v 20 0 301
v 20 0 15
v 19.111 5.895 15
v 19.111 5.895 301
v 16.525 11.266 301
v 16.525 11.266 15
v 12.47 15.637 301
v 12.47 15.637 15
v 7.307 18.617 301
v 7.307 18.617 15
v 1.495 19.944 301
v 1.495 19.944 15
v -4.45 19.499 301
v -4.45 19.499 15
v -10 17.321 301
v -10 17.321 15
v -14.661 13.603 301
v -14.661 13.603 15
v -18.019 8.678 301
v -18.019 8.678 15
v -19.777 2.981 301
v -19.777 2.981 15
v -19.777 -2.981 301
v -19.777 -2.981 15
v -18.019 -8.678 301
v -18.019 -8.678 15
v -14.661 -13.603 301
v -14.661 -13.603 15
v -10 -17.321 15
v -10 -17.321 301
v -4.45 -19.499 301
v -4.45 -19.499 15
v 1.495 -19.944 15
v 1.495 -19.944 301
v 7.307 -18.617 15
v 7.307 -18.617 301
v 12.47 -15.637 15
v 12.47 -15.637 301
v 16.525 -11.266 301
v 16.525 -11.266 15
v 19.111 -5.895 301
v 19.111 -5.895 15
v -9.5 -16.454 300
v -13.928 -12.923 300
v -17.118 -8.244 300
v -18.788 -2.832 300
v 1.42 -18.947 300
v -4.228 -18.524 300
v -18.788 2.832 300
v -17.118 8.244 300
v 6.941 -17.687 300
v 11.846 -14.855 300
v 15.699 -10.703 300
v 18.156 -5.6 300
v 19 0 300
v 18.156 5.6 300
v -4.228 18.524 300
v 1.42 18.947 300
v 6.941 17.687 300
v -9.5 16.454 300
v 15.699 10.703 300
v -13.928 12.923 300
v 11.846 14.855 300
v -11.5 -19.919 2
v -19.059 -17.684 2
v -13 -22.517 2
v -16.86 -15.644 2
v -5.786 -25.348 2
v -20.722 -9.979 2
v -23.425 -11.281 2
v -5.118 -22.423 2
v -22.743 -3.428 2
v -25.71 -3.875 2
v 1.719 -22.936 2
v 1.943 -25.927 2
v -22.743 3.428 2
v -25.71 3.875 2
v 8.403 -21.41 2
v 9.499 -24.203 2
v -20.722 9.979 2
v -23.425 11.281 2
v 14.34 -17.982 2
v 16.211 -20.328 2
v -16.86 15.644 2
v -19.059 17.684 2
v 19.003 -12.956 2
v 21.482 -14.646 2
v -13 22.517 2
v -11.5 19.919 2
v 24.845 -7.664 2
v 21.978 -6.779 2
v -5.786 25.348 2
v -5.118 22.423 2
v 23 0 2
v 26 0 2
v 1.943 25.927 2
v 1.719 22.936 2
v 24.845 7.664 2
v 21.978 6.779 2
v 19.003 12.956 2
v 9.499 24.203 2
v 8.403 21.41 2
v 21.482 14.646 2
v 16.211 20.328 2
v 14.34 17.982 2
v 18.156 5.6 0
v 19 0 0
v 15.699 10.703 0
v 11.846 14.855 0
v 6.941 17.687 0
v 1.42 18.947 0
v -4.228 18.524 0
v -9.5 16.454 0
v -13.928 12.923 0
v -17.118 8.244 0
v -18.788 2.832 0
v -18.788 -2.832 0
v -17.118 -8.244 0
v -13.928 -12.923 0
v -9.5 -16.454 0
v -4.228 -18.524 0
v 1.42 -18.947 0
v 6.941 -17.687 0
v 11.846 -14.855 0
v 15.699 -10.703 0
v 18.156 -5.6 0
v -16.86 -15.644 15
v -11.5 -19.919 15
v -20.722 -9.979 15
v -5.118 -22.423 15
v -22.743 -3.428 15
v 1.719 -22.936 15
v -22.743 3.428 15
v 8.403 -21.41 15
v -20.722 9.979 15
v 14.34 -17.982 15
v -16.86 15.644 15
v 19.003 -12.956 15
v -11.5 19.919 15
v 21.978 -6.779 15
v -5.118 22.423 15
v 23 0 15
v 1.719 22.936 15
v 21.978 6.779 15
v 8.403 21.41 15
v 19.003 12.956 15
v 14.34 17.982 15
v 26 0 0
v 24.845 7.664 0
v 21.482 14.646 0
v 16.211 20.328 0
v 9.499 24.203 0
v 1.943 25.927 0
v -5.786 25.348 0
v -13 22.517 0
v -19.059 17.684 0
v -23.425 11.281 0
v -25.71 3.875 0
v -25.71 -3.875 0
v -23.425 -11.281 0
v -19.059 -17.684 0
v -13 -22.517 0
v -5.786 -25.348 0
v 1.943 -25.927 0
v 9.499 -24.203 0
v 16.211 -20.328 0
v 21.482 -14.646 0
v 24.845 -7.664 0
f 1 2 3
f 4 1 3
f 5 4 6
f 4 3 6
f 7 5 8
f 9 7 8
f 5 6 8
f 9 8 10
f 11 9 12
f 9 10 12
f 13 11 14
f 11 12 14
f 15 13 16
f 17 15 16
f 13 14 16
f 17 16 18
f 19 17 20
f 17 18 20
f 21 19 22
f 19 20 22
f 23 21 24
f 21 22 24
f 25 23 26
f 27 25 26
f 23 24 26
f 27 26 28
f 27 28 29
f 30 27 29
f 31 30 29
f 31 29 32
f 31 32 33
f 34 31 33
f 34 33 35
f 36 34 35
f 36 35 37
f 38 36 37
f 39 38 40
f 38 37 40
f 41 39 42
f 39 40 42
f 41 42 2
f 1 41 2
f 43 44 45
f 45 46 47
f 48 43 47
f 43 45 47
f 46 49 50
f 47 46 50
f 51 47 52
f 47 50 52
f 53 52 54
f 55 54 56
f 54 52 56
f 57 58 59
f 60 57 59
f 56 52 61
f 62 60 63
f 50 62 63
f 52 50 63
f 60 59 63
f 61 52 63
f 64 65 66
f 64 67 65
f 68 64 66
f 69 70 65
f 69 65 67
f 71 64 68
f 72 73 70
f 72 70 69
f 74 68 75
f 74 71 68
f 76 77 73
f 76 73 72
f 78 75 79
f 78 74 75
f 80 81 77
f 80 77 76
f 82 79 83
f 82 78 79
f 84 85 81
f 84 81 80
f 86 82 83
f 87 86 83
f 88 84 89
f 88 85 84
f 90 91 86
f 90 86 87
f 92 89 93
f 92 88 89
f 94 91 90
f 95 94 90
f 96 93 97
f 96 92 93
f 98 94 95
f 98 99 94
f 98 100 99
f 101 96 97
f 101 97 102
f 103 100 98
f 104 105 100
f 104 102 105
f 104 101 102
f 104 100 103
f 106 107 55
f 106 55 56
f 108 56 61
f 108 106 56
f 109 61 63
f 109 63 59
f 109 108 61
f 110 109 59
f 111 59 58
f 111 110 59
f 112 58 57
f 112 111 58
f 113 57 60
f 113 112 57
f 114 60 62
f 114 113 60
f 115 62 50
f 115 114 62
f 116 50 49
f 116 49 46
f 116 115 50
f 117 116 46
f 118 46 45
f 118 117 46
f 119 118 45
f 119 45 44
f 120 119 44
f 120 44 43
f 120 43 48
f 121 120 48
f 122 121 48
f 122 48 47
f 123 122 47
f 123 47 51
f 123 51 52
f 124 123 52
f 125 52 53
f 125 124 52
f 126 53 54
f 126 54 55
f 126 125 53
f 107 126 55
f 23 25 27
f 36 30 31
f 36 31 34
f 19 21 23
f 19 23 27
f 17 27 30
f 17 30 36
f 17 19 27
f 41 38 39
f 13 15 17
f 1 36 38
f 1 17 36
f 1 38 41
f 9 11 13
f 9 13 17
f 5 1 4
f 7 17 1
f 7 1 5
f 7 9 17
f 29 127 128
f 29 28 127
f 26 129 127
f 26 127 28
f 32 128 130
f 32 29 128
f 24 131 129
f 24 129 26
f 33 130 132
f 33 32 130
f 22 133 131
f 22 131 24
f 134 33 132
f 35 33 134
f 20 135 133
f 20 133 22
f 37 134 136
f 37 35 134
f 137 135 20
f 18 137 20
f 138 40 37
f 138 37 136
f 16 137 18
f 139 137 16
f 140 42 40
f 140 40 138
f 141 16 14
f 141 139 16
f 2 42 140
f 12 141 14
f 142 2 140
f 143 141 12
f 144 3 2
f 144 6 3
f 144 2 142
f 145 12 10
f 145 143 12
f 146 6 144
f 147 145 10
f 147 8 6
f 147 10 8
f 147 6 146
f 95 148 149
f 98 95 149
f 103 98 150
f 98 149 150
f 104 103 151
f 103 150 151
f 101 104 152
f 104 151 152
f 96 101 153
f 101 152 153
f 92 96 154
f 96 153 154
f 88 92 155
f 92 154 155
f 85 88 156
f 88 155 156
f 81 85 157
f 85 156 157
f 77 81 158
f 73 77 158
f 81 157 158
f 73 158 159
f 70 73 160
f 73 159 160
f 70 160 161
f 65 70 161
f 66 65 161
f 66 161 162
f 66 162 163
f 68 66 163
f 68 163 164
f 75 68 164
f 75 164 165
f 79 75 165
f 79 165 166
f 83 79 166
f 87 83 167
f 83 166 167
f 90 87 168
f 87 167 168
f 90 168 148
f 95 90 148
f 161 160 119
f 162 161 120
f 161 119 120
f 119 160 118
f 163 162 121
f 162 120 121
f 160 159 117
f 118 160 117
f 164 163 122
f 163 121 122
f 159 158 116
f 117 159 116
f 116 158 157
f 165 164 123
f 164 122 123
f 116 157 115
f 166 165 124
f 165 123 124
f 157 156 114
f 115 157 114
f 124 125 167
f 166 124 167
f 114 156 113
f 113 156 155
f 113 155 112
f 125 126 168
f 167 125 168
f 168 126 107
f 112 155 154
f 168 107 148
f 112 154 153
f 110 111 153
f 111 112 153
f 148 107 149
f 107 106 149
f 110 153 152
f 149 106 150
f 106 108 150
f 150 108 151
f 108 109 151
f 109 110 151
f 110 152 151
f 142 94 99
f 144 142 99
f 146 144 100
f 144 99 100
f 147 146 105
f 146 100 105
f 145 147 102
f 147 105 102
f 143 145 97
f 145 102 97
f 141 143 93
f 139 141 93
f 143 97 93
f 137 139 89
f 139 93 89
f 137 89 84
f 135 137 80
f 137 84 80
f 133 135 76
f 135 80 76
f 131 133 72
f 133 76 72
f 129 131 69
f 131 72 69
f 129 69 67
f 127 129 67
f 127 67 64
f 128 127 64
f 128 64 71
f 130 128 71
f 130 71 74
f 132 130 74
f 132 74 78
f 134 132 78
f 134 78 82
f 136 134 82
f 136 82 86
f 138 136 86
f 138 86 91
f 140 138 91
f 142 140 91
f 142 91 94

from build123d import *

# Parameters (mm, degrees)
SKETCH2_R           = 20
SKETCH2_R_2         = 19
BOSS_EXTRUDE1_DEPTH = 300
SKETCH3_R           = 20
BOSS_EXTRUDE2_DEPTH = 1
SKETCH2_4_R         = 23
SKETCH2_4_R_2       = 20
BOSS_EXTRUDE3_DEPTH = 15
SKETCH2_5_R         = 26
SKETCH2_5_R_2       = 23
BOSS_EXTRUDE4_DEPTH = 2


with BuildPart() as part:
    # Sketch2 → Boss-Extrude1 (new body)
    with BuildSketch(Plane.XY):
        Circle(SKETCH2_R)
        Circle(SKETCH2_R_2, mode=Mode.SUBTRACT)
    extrude(amount=BOSS_EXTRUDE1_DEPTH)

    # Sketch3 → Boss-Extrude2 (add)
    with BuildSketch(Plane.XY.offset(300)):
        Circle(SKETCH3_R)
    extrude(amount=BOSS_EXTRUDE2_DEPTH)

    # Sketch2<4> → Boss-Extrude3 (add)
    with BuildSketch(Plane.XY):
        Circle(SKETCH2_4_R)
        Circle(SKETCH2_4_R_2, mode=Mode.SUBTRACT)
    extrude(amount=BOSS_EXTRUDE3_DEPTH)

    # Sketch2<5> → Boss-Extrude4 (add)
    with BuildSketch(Plane.XY):
        Circle(SKETCH2_5_R)
        Circle(SKETCH2_5_R_2, mode=Mode.SUBTRACT)
    extrude(amount=BOSS_EXTRUDE4_DEPTH)


solid = part.part
